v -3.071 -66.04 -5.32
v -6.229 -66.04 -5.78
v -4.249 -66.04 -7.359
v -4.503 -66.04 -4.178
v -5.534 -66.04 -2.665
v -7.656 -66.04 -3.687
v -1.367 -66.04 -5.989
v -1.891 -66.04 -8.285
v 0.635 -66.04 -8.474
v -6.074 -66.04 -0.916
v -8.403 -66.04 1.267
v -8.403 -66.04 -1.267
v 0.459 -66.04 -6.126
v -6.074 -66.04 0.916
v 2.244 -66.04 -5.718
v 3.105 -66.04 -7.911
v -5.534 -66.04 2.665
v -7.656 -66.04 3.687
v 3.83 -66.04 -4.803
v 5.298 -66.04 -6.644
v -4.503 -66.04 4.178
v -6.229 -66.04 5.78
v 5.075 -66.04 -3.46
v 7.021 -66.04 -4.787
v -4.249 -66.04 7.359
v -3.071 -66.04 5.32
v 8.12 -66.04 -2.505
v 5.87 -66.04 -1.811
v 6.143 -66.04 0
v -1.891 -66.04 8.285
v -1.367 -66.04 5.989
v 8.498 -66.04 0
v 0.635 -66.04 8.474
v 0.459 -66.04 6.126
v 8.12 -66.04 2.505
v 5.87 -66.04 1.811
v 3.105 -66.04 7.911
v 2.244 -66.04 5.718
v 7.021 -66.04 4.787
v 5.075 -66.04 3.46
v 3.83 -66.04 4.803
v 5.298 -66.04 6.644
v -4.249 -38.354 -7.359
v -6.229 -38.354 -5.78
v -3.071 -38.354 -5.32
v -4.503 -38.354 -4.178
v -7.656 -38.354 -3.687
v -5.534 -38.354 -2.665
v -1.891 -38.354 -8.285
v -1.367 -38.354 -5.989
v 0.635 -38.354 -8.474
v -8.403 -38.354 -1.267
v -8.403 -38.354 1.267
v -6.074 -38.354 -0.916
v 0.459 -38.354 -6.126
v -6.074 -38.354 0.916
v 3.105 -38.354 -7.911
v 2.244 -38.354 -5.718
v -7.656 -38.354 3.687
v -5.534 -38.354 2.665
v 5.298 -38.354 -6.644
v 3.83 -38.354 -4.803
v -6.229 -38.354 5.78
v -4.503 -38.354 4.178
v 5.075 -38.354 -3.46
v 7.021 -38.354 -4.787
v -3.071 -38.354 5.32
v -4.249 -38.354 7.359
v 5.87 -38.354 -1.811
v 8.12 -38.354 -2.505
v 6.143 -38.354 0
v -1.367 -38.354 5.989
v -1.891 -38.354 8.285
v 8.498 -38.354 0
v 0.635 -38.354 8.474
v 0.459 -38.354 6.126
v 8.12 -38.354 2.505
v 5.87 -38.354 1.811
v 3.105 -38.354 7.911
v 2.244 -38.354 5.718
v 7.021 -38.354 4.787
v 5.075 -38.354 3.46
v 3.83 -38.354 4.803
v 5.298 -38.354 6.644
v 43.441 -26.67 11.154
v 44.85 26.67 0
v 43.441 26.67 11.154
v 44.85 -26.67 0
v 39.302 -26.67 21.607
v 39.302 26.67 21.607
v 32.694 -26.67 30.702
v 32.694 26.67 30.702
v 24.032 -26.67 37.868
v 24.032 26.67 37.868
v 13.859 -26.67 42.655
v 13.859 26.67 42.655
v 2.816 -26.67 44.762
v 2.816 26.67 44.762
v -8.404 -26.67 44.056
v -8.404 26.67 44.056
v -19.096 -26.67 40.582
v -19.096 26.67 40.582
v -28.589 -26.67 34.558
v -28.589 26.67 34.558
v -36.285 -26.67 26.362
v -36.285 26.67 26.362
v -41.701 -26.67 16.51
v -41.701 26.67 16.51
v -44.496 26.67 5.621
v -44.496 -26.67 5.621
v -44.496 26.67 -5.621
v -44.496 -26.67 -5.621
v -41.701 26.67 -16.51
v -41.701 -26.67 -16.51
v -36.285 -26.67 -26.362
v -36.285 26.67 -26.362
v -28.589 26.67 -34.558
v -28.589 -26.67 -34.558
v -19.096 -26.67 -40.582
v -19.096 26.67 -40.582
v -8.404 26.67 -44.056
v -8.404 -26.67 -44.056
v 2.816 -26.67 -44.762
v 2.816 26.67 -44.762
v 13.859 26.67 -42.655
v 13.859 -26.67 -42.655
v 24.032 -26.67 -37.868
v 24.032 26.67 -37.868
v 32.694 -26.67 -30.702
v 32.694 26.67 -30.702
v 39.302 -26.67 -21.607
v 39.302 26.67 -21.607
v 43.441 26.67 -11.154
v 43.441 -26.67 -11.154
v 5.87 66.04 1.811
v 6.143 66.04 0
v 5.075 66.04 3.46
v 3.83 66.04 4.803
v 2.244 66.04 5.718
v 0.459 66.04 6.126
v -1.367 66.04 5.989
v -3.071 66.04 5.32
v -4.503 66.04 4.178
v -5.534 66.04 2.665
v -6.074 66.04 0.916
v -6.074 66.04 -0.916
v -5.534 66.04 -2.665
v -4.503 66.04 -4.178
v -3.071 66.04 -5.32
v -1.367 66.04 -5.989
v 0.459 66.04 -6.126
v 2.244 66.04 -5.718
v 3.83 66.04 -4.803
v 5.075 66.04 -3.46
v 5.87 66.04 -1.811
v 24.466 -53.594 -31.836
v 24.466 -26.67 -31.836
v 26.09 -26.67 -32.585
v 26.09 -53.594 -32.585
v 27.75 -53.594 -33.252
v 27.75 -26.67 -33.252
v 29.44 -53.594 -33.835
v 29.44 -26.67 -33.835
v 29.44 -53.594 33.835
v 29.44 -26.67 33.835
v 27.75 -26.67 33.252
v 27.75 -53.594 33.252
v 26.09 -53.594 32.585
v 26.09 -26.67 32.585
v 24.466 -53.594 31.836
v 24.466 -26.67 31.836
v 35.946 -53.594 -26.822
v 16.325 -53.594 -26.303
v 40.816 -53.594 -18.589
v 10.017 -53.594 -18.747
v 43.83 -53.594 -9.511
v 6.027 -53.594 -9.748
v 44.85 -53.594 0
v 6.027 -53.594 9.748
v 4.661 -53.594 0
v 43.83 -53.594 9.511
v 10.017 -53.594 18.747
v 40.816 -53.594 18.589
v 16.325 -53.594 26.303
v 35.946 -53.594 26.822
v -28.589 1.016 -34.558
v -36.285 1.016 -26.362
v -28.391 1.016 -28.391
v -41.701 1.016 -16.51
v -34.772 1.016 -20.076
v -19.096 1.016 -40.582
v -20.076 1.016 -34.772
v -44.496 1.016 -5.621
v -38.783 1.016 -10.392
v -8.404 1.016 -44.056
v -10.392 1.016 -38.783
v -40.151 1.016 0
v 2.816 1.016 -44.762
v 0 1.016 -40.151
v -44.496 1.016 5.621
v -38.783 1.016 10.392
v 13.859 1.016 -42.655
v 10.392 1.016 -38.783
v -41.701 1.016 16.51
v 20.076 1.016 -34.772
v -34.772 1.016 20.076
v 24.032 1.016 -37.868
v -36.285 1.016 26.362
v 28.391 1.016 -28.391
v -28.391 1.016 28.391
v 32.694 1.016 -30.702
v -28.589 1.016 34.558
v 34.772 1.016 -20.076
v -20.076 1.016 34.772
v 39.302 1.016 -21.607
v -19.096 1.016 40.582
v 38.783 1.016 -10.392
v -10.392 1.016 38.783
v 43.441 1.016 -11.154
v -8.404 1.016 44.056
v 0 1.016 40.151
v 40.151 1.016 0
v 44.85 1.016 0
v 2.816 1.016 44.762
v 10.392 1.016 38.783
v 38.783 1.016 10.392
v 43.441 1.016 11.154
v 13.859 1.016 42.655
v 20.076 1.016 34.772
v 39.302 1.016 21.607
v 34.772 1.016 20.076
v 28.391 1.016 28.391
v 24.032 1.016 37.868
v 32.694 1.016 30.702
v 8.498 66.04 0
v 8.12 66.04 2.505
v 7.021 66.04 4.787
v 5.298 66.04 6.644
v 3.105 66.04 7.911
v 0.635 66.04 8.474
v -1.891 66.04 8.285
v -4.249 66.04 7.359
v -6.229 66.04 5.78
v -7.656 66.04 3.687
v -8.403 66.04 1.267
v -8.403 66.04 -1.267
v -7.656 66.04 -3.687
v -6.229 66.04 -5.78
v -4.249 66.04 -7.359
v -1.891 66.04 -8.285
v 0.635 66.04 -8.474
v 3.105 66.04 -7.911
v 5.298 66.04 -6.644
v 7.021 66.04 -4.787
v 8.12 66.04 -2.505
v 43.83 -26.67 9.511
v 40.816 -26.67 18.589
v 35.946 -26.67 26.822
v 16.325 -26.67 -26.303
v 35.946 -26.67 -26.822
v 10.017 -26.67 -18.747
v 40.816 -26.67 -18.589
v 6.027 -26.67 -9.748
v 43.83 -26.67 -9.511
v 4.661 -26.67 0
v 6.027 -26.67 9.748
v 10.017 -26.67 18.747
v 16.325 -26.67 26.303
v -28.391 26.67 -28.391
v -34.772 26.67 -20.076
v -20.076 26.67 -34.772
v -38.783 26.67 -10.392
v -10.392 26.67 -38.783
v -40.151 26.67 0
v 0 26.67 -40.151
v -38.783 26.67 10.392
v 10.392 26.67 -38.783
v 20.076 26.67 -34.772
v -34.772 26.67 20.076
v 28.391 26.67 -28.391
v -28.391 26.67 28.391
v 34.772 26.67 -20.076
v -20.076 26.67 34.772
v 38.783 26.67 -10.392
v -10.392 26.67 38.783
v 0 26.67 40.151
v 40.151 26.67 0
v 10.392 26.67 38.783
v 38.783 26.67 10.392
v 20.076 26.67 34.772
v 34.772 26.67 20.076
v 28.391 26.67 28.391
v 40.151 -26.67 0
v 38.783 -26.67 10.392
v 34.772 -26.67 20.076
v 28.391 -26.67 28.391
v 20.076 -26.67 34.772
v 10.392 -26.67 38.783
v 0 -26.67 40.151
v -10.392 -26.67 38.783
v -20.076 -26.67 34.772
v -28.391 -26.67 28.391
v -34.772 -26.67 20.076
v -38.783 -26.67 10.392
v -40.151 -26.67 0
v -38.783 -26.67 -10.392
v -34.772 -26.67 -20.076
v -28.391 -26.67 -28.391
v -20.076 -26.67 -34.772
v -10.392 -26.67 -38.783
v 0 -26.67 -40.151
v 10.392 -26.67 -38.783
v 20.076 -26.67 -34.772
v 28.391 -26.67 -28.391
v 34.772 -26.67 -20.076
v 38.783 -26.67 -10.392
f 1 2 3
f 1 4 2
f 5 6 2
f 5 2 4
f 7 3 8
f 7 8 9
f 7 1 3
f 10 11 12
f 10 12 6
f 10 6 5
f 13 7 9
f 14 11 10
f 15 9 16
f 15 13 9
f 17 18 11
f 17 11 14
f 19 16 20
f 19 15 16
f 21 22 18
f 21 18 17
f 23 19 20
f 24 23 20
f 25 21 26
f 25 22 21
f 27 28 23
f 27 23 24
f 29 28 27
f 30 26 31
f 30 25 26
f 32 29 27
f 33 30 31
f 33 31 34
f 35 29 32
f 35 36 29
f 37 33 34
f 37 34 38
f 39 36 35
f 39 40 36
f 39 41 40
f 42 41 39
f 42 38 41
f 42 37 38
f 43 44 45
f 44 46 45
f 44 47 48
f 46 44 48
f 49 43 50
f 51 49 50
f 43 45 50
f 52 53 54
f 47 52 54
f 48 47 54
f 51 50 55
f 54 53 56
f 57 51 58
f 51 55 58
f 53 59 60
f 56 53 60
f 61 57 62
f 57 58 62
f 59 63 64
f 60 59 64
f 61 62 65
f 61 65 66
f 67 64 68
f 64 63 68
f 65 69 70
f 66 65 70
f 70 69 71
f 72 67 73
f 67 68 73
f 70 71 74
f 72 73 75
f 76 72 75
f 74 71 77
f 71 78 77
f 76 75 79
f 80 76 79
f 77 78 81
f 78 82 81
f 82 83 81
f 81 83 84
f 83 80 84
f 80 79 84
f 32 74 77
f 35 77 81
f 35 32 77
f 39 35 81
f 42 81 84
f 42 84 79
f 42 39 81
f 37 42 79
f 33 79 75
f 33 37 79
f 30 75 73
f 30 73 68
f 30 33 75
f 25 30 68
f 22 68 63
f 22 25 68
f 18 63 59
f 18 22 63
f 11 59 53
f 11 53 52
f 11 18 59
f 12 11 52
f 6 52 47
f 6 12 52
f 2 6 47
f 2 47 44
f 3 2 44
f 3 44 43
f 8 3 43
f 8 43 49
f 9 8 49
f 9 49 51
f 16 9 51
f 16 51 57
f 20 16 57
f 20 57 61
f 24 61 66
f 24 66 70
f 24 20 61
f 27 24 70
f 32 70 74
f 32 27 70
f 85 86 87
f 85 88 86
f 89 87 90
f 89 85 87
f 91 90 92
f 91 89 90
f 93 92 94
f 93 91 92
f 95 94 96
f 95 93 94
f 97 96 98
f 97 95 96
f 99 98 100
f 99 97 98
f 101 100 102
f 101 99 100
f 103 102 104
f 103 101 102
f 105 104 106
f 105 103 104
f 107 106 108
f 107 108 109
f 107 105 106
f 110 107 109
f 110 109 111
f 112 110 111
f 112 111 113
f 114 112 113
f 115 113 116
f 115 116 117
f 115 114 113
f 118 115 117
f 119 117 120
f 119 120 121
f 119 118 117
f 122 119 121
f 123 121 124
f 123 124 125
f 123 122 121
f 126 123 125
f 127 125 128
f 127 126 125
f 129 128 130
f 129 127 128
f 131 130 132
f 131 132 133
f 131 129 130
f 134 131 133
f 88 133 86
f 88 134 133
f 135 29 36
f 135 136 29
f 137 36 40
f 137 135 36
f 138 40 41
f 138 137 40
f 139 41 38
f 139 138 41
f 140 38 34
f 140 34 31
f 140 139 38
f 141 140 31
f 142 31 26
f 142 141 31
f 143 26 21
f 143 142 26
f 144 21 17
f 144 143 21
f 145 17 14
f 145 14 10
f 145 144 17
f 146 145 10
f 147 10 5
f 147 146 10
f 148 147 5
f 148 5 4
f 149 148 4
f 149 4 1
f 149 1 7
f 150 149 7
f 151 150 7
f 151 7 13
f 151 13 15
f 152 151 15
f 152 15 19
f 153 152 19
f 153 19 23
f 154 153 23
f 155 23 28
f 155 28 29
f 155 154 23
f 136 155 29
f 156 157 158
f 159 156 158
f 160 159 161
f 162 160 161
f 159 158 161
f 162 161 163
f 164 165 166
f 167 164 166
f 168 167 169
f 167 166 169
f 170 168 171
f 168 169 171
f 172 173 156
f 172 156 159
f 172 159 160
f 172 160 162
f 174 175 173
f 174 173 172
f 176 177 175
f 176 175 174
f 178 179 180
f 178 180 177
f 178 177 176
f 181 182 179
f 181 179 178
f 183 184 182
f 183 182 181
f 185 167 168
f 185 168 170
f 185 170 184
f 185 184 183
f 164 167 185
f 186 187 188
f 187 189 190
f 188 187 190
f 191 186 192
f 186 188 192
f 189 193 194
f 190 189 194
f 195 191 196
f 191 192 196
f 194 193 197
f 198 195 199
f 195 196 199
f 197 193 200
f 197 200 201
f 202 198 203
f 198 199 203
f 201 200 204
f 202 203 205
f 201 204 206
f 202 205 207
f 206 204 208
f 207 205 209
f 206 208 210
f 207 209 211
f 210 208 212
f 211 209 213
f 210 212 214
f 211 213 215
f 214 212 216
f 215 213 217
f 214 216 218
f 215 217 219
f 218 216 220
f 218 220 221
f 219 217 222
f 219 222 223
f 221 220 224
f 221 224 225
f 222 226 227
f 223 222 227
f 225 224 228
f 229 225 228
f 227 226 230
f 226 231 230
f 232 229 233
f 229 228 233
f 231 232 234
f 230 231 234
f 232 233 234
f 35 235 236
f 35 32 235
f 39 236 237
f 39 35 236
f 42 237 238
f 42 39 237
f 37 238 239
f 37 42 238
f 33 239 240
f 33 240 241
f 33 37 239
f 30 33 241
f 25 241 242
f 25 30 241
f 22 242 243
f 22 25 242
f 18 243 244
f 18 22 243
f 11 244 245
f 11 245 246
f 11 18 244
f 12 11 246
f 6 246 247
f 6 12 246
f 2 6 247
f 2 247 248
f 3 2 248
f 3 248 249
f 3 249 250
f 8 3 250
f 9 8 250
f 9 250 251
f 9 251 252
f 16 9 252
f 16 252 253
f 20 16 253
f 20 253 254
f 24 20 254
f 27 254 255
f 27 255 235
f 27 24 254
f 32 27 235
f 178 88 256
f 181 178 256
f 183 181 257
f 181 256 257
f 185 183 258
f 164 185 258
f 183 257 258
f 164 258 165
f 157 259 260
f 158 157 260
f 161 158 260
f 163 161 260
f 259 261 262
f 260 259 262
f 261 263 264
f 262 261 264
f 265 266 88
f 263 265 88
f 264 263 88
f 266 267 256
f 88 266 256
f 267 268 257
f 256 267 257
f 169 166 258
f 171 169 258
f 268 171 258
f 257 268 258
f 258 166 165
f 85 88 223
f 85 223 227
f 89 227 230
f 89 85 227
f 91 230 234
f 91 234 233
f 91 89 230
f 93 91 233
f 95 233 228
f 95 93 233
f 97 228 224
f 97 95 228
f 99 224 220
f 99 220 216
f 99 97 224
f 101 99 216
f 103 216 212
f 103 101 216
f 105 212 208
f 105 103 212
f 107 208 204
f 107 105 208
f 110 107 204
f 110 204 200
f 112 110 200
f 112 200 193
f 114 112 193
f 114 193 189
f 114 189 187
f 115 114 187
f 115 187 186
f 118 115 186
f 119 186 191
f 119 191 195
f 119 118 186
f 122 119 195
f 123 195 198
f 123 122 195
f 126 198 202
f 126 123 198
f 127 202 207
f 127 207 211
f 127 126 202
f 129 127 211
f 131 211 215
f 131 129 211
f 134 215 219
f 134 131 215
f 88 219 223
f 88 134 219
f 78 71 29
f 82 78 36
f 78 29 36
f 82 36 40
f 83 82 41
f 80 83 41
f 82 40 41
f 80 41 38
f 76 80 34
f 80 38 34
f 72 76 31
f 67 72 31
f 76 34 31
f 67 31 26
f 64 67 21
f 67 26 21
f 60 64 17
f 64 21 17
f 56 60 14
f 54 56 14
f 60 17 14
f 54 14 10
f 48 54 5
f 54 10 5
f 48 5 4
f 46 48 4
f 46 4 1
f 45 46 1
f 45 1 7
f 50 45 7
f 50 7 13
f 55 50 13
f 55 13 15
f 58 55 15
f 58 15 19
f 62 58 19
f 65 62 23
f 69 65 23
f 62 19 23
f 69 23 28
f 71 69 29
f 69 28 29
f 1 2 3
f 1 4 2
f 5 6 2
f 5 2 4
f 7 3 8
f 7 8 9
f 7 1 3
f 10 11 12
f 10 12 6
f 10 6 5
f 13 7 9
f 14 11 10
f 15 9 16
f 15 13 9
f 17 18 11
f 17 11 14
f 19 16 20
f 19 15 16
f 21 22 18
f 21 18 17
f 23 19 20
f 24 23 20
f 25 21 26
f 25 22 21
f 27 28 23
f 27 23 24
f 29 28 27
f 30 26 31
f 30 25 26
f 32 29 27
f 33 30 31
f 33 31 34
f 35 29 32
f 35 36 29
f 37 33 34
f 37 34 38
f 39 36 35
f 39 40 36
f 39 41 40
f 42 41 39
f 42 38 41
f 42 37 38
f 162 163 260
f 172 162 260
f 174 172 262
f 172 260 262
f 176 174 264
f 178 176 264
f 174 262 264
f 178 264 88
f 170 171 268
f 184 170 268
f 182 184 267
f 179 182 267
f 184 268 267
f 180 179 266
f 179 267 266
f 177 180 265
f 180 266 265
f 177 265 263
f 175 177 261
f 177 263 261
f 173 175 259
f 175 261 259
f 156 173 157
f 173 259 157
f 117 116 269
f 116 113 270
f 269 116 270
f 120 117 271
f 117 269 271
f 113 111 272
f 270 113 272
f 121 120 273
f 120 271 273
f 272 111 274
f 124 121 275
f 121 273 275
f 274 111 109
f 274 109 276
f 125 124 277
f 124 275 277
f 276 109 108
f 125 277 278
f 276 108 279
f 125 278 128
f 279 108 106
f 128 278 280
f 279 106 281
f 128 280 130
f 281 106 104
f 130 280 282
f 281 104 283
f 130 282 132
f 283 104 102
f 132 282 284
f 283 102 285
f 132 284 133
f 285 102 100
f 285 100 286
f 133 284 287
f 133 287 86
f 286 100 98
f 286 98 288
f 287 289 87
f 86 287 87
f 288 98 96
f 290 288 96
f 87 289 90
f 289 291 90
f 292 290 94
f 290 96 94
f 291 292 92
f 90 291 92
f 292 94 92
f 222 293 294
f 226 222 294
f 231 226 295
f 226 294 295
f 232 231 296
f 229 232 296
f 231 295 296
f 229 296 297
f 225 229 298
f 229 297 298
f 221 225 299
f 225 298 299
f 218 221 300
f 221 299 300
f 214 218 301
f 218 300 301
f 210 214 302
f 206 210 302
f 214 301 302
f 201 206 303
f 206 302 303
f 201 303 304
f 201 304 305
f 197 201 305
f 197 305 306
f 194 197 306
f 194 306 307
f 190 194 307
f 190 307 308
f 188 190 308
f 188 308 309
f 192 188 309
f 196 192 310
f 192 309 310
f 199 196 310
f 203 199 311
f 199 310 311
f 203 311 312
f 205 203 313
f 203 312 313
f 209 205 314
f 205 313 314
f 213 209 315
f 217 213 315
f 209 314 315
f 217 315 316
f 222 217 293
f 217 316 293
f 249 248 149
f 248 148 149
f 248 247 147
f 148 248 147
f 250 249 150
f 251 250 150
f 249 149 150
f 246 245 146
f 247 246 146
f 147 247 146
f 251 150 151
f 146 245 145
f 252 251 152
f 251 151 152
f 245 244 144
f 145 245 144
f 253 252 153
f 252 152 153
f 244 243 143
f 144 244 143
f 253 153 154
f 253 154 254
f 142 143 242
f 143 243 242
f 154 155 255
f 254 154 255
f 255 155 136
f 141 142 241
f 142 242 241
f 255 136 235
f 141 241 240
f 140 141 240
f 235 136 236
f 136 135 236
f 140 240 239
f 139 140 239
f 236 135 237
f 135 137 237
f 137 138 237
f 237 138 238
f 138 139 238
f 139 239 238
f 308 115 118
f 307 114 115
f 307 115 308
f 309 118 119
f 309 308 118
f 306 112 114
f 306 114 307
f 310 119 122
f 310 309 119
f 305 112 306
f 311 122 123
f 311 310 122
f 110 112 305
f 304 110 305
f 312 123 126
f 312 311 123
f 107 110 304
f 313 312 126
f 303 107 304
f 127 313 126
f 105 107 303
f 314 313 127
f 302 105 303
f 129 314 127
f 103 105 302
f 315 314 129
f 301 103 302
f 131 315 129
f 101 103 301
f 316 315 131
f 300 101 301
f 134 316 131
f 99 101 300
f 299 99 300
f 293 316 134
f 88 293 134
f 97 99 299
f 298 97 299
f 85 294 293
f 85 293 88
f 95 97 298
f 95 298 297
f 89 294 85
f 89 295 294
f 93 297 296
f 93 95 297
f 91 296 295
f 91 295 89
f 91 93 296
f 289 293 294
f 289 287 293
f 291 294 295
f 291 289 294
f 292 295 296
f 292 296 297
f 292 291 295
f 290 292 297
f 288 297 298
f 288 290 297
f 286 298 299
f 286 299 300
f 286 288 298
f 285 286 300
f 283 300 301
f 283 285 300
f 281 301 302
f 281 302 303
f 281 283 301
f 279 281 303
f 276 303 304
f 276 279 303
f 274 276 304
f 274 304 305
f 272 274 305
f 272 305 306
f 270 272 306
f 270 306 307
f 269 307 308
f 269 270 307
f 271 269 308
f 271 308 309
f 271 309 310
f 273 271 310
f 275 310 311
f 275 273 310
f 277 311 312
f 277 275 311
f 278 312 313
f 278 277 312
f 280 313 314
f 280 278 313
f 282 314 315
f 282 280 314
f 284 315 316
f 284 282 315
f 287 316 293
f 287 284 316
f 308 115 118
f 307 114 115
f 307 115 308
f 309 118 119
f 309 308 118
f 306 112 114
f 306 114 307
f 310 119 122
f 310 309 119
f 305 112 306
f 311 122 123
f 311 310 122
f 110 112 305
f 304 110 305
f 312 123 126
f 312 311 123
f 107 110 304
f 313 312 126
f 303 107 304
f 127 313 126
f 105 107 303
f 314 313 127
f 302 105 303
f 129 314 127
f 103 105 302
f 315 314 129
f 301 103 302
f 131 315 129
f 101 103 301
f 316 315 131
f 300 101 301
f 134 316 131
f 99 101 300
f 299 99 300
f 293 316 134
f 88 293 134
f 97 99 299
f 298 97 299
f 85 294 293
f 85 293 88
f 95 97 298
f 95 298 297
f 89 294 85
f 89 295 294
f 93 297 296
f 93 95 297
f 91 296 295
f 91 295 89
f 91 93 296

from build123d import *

# Parameters (mm, degrees)
F1_R     = 8.4979438247
F1_R_2   = 6.1426821127
F2_DEPTH = 66.04
F0_R     = 44.8501259772
F0_R_2   = 40.1510242743
F3_DEPTH = 26.67
F4_DEPTH = 27.686
F6_DEPTH = 26.924


with BuildPart() as f2:
    # F1 (on Front) → F2 (new body, symmetric)
    with BuildSketch(Plane.XZ):
        Circle(F1_R)
        Circle(F1_R_2, mode=Mode.SUBTRACT)
    extrude(amount=F2_DEPTH, both=True)


with BuildPart() as f3:
    # F0 (on Front) → F3 (new body, symmetric)
    with BuildSketch(Plane.XZ):
        Circle(F0_R)
        Circle(F0_R_2, mode=Mode.SUBTRACT)
    extrude(amount=F3_DEPTH, both=True)


with BuildPart() as f4:
    # F4 (new): a face of the model
    f4_faces = [f2.part.faces().sort_by_distance(p)[0] for p in [
        (-8.2575856766, -66.04, 0),
    ]]
    extrude(f4_faces, amount=-F4_DEPTH)


with BuildPart() as f4b:
    # F4#2 (new): a face of the model
    f4_2_faces = [f3.part.faces().sort_by_distance(p)[0] for p in [
        (-43.5815728485, -26.67, 0),
    ]]
    extrude(f4_2_faces, amount=-F4_DEPTH)


with BuildPart() as f6:
    # F5 (on face) → F6 (new body)
    with BuildSketch(Plane.XZ.offset(26.67)):
        with BuildLine():
            ThreePointArc((44.8501259772, 0), (40.8163156263, 18.5893028073), (29.4404845845, 33.8347700982))
            ThreePointArc((29.4404845845, 33.8347700982), (26.9156396974, 32.9291956042), (24.4664016426, 31.8355138319))
            ThreePointArc((24.4664016426, 31.8355138319), (36.0170503827, 17.744769145), (40.1510242743, 0))
            ThreePointArc((40.1510242743, 0), (36.0170503827, -17.744769145), (24.4664016426, -31.8355138319))
            ThreePointArc((24.4664016426, -31.8355138319), (26.9156396974, -32.9291956042), (29.4404845845, -33.8347700982))
            ThreePointArc((29.4404845845, -33.8347700982), (40.8163156263, -18.5893028073), (44.8501259772, 0))
        make_face()
        with BuildLine():
            ThreePointArc((40.1510242743, 0), (36.0170503827, 17.744769145), (24.4664016426, 31.8355138319))
            ThreePointArc((24.4664016426, 31.8355138319), (4.6614859843, 0), (24.4664016426, -31.8355138319))
            ThreePointArc((24.4664016426, -31.8355138319), (36.0170503827, -17.744769145), (40.1510242743, 0))
        make_face()
    extrude(amount=F6_DEPTH)


solid = Compound([f2.part, f3.part, f4.part, f4b.part, f6.part])
